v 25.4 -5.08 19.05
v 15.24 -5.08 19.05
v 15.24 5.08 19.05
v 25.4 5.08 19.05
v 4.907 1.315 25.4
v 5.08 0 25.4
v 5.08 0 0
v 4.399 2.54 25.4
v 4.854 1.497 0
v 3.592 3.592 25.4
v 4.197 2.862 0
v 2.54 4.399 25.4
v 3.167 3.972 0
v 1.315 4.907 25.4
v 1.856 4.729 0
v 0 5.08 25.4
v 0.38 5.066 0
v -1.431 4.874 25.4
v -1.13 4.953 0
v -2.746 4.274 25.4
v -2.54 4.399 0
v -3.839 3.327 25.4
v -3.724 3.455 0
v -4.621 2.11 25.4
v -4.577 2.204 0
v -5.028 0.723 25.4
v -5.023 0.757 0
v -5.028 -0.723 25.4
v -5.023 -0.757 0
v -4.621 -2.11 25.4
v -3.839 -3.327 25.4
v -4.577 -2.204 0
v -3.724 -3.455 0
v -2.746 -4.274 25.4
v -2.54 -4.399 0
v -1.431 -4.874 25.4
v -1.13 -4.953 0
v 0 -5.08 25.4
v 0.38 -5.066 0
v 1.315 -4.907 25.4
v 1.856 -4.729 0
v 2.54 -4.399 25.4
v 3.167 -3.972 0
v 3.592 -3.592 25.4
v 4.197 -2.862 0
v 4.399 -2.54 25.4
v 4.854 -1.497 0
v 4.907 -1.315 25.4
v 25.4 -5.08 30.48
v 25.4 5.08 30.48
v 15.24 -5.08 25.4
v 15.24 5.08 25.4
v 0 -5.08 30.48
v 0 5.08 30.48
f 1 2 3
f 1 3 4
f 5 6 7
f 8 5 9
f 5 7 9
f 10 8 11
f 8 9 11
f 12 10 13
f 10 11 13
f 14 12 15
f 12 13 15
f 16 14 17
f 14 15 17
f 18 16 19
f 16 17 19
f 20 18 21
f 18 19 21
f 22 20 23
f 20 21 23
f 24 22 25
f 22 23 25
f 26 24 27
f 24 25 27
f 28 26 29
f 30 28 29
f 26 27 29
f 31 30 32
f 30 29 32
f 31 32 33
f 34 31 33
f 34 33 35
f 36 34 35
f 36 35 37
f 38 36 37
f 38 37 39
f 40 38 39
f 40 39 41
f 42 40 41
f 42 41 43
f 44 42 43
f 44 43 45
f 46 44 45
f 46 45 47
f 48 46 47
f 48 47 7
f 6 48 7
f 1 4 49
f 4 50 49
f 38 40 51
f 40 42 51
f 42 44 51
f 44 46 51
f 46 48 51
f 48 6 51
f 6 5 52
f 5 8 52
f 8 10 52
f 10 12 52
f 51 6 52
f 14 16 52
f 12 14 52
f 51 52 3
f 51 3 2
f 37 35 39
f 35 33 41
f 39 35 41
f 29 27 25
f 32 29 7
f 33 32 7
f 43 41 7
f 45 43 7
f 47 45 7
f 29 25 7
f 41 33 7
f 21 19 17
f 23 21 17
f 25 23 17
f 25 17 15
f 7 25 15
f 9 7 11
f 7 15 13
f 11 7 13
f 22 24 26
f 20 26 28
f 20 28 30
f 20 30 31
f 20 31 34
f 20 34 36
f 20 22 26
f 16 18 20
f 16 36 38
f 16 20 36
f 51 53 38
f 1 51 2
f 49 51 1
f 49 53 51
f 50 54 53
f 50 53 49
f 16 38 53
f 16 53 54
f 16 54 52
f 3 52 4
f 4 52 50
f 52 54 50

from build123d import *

# Parameters (mm, degrees)
F0_R     = 5.08
F1_DEPTH = 25.4
F2_W     = 25.4
F2_H     = 10.16
F3_DEPTH = 5.08
F4_W     = 10.16
F4_H     = 10.16
F5_DEPTH = 6.35


with BuildPart() as f1:
    # F0 (on Top) → F1 (new body)
    with BuildSketch(Plane.XY):
        Circle(F0_R)
    extrude(amount=F1_DEPTH)

    # F2 (on face) → F3 (join)
    with BuildSketch(Plane.XY.offset(25.4)):
        with Locations((12.7, 0)):
            Rectangle(F2_W, F2_H)
    extrude(amount=F3_DEPTH)

    # F4 (on face) → F5 (join)
    with BuildSketch(Plane(origin=(0, 0, 25.4), x_dir=(1, 0, 0), z_dir=(0, 0, -1))):
        with Locations((20.32, 0)):
            Rectangle(F4_W, F4_H)
    extrude(amount=F5_DEPTH)


solid = f1.part
